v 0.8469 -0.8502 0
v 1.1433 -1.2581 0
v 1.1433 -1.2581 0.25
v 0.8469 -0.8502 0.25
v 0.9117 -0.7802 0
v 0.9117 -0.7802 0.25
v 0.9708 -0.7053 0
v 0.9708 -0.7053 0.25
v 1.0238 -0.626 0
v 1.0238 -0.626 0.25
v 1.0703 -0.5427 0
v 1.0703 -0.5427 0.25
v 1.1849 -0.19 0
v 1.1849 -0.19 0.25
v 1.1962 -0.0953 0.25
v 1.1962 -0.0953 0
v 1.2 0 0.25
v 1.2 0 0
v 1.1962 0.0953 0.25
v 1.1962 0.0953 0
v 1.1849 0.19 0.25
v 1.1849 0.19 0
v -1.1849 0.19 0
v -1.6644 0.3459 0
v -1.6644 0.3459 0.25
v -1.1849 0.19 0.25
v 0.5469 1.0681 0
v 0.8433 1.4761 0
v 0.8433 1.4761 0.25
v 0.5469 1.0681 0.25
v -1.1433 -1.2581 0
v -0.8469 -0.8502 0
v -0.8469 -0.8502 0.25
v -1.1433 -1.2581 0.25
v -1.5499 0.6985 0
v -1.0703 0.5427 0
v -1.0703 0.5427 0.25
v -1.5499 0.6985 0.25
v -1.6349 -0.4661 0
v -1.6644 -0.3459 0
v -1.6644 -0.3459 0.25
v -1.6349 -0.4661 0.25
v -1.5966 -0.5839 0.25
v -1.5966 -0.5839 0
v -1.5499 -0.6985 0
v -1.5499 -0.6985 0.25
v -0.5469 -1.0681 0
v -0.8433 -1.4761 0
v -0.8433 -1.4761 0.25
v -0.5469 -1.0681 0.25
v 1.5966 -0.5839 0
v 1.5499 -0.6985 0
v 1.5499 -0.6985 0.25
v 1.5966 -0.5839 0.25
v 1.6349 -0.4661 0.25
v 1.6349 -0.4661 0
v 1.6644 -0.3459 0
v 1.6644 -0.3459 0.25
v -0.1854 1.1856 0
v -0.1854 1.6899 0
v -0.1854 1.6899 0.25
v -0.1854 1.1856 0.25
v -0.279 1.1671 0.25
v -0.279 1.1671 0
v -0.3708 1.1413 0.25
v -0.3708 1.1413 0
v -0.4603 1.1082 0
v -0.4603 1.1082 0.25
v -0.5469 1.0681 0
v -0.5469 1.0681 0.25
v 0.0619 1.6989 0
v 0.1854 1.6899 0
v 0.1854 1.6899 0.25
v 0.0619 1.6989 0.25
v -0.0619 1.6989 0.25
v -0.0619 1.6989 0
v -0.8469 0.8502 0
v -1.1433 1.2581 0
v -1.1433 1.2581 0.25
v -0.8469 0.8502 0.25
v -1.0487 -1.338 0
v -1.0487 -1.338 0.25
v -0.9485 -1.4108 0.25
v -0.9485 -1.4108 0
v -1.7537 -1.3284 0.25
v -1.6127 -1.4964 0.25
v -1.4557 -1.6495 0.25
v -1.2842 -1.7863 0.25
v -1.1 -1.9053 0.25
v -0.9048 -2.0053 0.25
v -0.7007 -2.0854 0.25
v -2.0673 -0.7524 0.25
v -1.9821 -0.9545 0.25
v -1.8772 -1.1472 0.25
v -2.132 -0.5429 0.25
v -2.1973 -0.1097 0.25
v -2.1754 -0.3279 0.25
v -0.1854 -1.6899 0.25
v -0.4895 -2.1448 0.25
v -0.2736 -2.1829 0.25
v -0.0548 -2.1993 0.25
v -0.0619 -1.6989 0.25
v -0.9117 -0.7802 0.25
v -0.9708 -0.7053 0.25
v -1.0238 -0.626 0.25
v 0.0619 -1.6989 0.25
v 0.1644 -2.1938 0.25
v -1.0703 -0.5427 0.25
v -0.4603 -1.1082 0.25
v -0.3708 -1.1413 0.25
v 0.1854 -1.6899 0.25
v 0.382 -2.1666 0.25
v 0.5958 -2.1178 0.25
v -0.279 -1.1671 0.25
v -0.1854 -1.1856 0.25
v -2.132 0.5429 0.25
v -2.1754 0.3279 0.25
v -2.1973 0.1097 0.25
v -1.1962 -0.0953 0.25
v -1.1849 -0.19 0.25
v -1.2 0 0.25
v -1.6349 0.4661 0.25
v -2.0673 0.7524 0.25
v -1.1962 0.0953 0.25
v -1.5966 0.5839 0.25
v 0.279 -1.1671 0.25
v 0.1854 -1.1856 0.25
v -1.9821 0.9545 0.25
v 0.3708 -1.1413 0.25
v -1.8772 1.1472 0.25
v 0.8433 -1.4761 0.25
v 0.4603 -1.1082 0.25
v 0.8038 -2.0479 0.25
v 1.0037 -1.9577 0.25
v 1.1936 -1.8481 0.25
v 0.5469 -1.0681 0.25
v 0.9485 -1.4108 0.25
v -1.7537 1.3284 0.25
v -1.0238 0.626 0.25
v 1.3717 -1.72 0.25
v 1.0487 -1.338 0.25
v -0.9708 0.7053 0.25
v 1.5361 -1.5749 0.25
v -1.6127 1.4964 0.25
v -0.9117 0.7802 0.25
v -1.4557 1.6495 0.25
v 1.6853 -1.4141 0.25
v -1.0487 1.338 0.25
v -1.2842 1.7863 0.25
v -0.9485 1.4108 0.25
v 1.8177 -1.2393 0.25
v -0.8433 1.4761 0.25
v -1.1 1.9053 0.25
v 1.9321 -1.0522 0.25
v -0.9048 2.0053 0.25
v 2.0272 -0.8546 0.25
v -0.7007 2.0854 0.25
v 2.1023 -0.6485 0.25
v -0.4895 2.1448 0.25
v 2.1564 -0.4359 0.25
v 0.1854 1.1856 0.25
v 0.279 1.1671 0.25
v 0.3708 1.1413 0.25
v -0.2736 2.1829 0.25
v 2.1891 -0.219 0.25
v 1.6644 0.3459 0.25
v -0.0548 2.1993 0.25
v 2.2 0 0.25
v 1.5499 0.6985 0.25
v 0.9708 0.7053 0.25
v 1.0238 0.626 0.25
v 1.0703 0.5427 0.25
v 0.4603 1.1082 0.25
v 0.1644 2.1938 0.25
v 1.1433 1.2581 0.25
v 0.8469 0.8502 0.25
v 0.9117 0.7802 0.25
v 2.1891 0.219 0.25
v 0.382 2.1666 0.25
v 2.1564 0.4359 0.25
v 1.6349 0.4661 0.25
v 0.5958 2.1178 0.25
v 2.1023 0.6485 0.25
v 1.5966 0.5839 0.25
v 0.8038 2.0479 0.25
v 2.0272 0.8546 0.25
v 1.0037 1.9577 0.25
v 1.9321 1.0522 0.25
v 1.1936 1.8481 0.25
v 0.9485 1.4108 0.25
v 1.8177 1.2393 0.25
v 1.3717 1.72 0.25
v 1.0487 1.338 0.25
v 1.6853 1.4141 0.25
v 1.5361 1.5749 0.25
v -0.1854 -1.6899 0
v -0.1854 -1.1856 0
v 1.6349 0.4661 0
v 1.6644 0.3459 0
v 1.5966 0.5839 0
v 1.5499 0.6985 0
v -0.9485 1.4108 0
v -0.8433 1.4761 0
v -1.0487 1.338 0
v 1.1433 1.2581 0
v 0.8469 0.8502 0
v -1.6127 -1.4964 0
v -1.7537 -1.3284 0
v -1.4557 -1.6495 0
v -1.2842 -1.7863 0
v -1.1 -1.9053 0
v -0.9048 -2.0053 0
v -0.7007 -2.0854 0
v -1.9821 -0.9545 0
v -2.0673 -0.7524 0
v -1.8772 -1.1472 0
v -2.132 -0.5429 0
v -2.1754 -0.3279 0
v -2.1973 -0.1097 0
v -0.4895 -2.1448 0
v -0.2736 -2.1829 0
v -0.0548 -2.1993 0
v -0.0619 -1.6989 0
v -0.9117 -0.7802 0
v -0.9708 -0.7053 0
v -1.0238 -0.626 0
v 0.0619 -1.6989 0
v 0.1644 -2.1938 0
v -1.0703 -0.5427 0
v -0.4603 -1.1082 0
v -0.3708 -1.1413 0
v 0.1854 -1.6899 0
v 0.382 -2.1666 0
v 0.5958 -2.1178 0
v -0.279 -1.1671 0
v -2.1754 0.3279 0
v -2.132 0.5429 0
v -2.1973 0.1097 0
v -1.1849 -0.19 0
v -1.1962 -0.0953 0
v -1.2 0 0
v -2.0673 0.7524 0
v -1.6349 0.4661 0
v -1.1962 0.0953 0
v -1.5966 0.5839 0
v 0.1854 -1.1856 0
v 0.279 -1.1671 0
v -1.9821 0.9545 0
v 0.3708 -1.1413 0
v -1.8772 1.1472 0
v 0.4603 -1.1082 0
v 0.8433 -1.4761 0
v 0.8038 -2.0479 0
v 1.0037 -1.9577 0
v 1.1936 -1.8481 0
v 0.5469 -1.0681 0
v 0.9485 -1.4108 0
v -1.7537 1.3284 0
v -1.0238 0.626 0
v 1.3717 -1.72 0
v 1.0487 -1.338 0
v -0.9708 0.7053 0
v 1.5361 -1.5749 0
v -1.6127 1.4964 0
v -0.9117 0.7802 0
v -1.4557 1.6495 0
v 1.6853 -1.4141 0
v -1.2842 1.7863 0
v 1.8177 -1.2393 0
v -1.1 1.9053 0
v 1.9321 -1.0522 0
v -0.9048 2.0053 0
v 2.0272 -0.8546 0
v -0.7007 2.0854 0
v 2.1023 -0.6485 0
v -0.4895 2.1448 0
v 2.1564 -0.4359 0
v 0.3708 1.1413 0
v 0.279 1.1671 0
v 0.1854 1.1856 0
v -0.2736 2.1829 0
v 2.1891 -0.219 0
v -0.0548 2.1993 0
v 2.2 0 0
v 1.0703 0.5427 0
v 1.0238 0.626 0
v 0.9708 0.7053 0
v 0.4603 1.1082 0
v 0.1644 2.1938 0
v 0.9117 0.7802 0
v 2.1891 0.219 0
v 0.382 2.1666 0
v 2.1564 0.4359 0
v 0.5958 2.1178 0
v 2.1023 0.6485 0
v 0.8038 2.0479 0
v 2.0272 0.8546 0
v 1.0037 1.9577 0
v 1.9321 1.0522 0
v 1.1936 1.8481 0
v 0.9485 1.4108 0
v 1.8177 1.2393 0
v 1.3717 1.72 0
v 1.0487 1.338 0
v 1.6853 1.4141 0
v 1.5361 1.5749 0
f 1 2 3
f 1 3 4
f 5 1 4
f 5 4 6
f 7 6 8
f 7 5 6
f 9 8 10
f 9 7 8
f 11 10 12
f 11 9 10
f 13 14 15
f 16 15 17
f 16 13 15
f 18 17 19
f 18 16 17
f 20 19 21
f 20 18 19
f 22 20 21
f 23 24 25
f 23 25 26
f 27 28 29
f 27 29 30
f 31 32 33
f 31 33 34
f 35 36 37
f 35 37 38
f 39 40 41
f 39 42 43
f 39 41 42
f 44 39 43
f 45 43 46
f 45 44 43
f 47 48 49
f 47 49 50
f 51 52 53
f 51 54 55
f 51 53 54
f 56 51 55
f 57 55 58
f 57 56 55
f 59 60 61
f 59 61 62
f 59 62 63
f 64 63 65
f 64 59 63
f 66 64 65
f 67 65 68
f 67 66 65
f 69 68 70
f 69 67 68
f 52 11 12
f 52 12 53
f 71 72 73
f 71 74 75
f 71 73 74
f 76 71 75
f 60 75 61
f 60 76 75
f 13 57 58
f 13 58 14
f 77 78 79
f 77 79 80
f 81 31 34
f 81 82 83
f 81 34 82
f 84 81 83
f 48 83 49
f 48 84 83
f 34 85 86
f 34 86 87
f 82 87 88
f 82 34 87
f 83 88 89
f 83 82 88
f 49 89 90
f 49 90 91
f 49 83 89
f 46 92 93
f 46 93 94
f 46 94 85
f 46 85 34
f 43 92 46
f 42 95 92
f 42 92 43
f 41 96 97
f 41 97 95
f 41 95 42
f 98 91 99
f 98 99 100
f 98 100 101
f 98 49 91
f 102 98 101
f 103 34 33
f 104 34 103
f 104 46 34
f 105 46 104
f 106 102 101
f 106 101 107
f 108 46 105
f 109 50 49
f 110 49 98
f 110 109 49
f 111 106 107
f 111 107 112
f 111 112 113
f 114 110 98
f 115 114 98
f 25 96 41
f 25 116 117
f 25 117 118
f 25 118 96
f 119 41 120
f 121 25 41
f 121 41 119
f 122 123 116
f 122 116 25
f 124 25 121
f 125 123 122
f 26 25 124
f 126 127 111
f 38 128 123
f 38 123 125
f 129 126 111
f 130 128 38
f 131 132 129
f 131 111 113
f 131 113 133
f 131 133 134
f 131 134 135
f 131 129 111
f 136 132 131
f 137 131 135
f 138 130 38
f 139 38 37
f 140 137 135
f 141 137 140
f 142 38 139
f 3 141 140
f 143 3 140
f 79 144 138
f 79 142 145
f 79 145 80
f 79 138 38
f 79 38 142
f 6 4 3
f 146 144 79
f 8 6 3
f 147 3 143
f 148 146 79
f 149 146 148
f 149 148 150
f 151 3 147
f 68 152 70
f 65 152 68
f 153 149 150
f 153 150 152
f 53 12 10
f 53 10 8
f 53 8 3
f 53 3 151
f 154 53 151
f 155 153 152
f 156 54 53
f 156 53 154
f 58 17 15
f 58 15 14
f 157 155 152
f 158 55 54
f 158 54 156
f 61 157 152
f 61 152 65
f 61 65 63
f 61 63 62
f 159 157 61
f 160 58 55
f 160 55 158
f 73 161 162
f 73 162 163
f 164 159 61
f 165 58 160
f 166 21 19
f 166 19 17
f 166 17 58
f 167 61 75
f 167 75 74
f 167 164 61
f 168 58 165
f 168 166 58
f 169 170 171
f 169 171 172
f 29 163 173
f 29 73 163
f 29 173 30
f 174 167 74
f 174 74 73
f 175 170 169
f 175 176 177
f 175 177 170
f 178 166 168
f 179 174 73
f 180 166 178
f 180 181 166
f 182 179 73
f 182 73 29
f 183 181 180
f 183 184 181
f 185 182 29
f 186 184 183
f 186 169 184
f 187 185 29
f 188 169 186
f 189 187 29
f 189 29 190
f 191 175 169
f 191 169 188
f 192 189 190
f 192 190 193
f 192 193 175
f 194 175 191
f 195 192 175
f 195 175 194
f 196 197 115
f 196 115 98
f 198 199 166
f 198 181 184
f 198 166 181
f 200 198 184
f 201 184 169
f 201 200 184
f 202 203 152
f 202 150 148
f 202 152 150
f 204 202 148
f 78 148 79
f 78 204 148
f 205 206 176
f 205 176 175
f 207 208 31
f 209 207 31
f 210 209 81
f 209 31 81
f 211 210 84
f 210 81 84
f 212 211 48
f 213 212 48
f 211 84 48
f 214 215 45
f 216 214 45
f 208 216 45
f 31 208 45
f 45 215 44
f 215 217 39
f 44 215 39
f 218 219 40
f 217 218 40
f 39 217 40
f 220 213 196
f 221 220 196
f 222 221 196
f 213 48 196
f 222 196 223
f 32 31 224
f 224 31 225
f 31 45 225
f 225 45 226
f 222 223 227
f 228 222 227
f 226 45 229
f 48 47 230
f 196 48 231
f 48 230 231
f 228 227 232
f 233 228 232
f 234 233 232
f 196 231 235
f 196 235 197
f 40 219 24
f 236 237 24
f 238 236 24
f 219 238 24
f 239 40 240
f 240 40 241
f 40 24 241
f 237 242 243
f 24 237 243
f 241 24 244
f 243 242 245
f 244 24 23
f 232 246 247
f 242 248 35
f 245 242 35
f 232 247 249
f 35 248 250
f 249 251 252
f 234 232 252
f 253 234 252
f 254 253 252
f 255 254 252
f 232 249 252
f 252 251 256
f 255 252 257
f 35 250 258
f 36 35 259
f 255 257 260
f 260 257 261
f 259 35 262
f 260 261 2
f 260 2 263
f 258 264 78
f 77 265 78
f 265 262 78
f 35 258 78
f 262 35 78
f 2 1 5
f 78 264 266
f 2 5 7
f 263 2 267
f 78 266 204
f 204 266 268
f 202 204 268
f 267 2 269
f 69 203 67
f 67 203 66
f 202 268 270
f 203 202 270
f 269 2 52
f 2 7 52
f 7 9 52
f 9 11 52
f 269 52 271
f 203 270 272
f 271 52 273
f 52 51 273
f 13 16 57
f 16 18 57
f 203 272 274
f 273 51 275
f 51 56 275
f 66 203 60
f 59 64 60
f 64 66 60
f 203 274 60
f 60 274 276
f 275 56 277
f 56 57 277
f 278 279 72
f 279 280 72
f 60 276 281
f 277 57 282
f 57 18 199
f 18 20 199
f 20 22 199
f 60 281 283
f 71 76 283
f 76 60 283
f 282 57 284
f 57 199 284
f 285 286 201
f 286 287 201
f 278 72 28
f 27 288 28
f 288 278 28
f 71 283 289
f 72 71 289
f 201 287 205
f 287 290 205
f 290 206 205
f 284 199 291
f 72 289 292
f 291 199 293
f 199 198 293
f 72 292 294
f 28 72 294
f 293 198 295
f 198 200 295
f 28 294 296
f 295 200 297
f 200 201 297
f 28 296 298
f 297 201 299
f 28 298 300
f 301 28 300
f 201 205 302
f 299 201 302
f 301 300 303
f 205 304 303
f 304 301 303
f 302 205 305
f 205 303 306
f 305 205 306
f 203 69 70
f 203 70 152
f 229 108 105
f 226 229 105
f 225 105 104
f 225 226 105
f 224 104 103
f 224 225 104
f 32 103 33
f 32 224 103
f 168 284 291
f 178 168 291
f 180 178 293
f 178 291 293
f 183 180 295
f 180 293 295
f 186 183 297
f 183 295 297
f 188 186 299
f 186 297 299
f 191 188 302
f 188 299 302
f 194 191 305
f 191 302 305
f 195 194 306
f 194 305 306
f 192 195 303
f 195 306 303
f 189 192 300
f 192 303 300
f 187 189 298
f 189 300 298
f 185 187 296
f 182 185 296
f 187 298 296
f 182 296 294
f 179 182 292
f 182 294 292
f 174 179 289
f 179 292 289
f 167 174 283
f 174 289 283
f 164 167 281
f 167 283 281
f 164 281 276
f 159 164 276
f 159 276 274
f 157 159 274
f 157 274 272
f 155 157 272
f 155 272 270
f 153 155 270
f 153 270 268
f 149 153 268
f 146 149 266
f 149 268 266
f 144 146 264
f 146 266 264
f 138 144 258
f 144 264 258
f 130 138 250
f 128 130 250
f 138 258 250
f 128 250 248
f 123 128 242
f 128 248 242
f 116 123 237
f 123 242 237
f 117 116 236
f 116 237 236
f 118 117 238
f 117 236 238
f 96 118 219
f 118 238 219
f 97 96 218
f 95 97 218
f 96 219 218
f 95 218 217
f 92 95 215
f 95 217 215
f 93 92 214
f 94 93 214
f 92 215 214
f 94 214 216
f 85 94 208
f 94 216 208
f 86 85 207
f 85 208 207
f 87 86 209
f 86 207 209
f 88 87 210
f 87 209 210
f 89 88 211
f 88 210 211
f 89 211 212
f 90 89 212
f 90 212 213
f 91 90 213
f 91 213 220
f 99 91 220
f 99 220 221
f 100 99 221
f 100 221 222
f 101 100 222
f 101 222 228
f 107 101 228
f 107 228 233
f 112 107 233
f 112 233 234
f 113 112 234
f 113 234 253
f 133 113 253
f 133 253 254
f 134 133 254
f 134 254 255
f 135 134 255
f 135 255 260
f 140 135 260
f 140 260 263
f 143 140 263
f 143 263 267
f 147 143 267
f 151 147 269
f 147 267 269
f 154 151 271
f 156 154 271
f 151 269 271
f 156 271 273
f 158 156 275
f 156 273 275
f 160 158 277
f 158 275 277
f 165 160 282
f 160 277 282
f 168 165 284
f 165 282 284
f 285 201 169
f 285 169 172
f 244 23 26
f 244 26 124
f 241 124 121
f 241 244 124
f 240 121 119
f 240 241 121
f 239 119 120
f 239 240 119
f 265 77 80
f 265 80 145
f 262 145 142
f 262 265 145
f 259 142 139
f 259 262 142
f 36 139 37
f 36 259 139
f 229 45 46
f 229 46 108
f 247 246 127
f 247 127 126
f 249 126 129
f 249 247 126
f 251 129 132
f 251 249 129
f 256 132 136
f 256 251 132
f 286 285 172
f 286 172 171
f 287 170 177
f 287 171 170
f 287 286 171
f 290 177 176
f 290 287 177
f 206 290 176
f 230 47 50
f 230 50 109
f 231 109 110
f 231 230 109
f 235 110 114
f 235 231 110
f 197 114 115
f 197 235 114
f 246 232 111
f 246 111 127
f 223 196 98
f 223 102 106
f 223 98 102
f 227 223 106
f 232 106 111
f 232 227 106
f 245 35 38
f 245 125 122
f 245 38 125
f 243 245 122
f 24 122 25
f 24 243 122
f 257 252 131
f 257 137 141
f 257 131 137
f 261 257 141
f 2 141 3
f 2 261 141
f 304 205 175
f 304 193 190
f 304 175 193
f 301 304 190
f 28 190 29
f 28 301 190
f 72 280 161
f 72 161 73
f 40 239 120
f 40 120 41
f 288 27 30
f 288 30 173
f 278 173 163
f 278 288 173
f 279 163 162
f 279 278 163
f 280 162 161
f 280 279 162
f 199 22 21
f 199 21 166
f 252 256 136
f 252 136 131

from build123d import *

# Parameters (mm, degrees)
SKETCH1_R          = 2.2
SKETCH1_R_2        = 1.2
EXTRUDE1_DEPTH     = 0.25
CUT_EXTRUDE1_DEPTH = 4.121297807
CIRPATTERN1_COUNT  = 10


with BuildPart() as part:
    # Sketch1 → Extrude1 (new body)
    with BuildSketch(Plane.XY):
        Circle(SKETCH1_R)
        Circle(SKETCH1_R_2, mode=Mode.SUBTRACT)
    extrude(amount=EXTRUDE1_DEPTH)

    # Sketch2 → Cut-Extrude1 (cut, through all)
    with BuildSketch(Plane.XY):
        with BuildLine():
            Line((-0.185410197, 1.689858887), (-0.185410197, 1.185589752))
            Line((-0.185410197, 1.185589752), (0.185410197, 1.185589752))
            Line((0.185410197, 1.185589752), (0.185410197, 1.689858887))
            ThreePointArc((0.185410197, 1.689858887), (0, 1.7), (-0.185410197, 1.689858887))
        make_face()
    cut_extrude1 = extrude(amount=CUT_EXTRUDE1_DEPTH, mode=Mode.SUBTRACT)

    # CirPattern1: Cut-Extrude1 ×10 about axis
    cirpattern1_axis = Axis((0, 0, 0), (0, 0, 1))
    for i in range(1, CIRPATTERN1_COUNT):
        add(cut_extrude1.rotate(cirpattern1_axis, i * 360 / CIRPATTERN1_COUNT), mode=Mode.SUBTRACT)


solid = part.part
